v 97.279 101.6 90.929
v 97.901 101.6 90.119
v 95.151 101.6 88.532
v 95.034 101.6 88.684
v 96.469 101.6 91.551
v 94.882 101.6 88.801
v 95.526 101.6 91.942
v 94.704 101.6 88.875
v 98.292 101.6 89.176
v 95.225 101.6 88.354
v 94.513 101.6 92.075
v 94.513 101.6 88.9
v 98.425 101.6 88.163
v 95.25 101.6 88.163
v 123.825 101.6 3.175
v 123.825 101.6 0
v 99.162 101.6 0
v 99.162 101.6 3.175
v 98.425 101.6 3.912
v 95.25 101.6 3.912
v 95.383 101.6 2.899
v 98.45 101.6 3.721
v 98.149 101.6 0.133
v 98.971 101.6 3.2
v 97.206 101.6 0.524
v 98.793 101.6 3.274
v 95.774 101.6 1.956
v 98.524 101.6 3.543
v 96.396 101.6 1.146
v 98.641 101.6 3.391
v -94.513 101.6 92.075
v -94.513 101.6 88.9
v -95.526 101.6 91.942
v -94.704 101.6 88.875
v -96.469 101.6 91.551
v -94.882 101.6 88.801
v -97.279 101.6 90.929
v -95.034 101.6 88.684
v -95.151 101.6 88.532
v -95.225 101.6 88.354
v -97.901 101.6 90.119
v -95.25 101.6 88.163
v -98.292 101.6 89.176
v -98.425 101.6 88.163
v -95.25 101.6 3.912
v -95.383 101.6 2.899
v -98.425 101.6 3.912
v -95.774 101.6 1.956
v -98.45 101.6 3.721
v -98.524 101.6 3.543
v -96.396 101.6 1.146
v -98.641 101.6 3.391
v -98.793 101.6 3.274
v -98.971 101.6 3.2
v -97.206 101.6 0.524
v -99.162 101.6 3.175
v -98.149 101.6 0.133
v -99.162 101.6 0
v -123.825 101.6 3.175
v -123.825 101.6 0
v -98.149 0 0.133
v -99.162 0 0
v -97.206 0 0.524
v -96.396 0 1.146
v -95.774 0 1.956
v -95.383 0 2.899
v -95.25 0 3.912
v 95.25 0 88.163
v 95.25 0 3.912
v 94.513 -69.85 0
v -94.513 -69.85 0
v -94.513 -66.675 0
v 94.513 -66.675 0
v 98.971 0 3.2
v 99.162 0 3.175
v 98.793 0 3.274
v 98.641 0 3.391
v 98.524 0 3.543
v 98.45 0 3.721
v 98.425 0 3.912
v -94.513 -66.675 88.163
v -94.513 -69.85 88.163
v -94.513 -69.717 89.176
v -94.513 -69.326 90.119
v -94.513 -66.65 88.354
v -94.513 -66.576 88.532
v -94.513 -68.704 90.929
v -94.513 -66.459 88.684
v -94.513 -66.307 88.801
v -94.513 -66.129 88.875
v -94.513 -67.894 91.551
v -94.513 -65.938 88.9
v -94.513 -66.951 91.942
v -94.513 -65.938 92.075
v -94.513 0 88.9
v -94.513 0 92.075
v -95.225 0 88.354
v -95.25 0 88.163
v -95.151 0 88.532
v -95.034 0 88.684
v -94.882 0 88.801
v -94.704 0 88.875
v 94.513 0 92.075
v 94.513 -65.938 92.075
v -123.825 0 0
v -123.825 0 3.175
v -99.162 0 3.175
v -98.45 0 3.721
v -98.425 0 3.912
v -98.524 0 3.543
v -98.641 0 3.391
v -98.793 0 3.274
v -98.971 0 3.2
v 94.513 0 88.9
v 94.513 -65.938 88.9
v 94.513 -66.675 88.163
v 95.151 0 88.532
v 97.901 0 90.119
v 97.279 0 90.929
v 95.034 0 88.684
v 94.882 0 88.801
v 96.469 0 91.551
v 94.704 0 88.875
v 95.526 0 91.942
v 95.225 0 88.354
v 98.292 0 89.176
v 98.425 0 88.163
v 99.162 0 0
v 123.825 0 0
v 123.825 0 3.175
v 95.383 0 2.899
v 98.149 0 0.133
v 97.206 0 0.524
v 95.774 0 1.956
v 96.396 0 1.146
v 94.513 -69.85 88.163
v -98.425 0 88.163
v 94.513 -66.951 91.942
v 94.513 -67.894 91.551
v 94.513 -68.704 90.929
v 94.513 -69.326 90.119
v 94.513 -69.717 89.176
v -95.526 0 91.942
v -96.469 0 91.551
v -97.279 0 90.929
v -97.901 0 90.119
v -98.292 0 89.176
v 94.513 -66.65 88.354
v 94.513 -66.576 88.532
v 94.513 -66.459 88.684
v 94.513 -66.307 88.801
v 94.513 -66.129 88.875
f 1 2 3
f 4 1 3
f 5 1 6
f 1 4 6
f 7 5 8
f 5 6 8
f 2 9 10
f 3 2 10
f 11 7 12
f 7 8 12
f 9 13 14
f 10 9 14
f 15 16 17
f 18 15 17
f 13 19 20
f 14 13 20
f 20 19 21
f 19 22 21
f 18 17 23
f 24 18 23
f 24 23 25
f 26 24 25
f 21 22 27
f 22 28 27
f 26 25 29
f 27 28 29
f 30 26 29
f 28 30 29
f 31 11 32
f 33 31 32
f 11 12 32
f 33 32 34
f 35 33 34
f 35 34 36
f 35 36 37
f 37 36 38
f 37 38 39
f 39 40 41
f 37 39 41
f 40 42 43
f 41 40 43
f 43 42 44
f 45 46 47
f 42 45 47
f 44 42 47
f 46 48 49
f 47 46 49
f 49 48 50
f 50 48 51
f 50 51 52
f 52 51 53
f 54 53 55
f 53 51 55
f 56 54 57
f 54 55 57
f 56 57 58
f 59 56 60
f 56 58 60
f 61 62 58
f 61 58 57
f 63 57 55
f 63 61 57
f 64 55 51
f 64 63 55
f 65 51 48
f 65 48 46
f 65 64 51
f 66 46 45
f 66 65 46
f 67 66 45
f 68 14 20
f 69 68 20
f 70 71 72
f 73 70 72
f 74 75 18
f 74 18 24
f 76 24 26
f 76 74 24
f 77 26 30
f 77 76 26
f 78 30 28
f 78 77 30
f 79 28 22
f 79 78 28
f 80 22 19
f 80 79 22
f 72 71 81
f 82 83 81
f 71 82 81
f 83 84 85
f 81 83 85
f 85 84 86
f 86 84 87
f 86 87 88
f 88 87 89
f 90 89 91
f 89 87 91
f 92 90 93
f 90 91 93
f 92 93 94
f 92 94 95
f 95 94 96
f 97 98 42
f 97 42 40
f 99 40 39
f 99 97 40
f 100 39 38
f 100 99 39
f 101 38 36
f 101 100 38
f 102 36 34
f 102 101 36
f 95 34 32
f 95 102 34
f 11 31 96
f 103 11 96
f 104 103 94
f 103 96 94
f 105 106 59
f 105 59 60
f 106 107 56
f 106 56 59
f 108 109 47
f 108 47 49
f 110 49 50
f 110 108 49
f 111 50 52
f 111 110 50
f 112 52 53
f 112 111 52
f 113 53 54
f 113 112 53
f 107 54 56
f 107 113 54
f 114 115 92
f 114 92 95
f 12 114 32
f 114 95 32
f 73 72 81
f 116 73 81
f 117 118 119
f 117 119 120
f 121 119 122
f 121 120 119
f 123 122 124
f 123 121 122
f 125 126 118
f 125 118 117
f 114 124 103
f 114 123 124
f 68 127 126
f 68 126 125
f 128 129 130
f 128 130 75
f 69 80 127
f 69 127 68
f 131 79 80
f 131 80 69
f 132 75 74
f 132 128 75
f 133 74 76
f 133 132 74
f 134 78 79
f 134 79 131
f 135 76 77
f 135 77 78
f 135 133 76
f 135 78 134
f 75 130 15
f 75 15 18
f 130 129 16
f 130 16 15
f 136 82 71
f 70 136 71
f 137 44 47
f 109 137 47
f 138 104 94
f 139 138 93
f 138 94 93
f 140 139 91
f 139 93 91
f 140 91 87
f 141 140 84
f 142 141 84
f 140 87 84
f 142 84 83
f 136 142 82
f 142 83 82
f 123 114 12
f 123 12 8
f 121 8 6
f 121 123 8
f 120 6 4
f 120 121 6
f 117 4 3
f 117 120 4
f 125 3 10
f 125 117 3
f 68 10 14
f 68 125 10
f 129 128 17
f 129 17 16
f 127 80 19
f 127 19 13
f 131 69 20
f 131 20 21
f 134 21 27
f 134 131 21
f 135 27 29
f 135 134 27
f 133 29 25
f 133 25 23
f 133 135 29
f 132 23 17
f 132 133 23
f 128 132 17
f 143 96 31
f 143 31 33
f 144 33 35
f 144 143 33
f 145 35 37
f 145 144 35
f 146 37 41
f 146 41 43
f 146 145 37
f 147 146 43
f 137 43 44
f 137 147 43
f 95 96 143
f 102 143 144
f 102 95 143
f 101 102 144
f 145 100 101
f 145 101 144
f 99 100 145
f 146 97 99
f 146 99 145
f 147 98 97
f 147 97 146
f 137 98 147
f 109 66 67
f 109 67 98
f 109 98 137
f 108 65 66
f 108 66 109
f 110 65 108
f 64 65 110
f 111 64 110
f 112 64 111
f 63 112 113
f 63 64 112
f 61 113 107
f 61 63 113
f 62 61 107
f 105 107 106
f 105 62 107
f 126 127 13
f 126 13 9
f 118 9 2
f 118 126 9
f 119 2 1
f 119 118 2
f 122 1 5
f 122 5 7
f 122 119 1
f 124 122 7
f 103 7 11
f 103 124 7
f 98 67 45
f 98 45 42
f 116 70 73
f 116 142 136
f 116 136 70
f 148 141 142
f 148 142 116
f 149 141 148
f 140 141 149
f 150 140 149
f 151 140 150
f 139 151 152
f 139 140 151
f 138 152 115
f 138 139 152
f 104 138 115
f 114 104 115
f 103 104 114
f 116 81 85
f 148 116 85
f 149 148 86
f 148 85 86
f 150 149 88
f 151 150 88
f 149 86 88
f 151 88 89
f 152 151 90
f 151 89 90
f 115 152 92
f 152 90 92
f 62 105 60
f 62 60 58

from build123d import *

# Parameters (mm, degrees)
BASE_FLANGE1_DEPTH = 101.6
EDGE_FLANGE1_START = -94.5134
EDGE_FLANGE1_DEPTH = 189.0268


# Read off the part's stored shape, not the designer's step: Edge-Flange1
# Sheet-metal steps are written as plain solids
with BuildPart() as part:
    # Sketch1 → Base-Flange1 (new body)
    with BuildSketch(Plane(origin=(0, 0, 0), x_dir=(1, 0, 0), z_dir=(0, 1, 0))):
        with BuildLine():
            Line((-123.825, 0), (-99.1616, 0))
            ThreePointArc((-99.1616, 0), (-96.395681115, -1.145681115), (-95.25, -3.9116))
            Line((-95.25, -3.9116), (-95.25, -88.1634))
            ThreePointArc((-95.25, -88.1634), (-95.034254855, -88.684254855), (-94.5134, -88.9))
            Line((-94.5134, -88.9), (94.5134, -88.9))
            ThreePointArc((94.5134, -88.9), (95.034254855, -88.684254855), (95.25, -88.1634))
            Line((95.25, -88.1634), (95.25, -3.9116))
            ThreePointArc((95.25, -3.9116), (96.395681115, -1.145681115), (99.1616, 0))
            Line((99.1616, 0), (123.825, 0))
            Line((123.825, 0), (123.825, -3.175))
            Line((123.825, -3.175), (99.1616, -3.175))
            ThreePointArc((99.1616, -3.175), (98.640745145, -3.390745145), (98.425, -3.9116))
            Line((98.425, -3.9116), (98.425, -88.1634))
            ThreePointArc((98.425, -88.1634), (97.279318885, -90.929318885), (94.5134, -92.075))
            Line((94.5134, -92.075), (-94.5134, -92.075))
            ThreePointArc((-94.5134, -92.075), (-97.279318885, -90.929318885), (-98.425, -88.1634))
            Line((-98.425, -88.1634), (-98.425, -3.9116))
            ThreePointArc((-98.425, -3.9116), (-98.640745145, -3.390745145), (-99.1616, -3.175))
            Line((-99.1616, -3.175), (-123.825, -3.175))
            Line((-123.825, -3.175), (-123.825, 0))
        make_face()
    extrude(amount=BASE_FLANGE1_DEPTH)

    # Edge-Flange1 outline → Edge-Flange1 (add)
    with BuildSketch(Plane.YZ.offset(EDGE_FLANGE1_START)):
        with BuildLine():
            Line((-69.85, 0), (-66.675, 0))
            Line((-66.675, 0), (-66.675, 88.1634))
            ThreePointArc((-66.675, 88.1634), (-66.459254855, 88.684254855), (-65.9384, 88.9))
            Line((-65.9384, 88.9), (0, 88.9))
            Line((0, 88.9), (0, 92.075))
            Line((0, 92.075), (-65.9384, 92.075))
            ThreePointArc((-65.9384, 92.075), (-68.704318885, 90.929318885), (-69.85, 88.1634))
            Line((-69.85, 88.1634), (-69.85, 0))
        make_face()
    extrude(amount=EDGE_FLANGE1_DEPTH)


solid = part.part
